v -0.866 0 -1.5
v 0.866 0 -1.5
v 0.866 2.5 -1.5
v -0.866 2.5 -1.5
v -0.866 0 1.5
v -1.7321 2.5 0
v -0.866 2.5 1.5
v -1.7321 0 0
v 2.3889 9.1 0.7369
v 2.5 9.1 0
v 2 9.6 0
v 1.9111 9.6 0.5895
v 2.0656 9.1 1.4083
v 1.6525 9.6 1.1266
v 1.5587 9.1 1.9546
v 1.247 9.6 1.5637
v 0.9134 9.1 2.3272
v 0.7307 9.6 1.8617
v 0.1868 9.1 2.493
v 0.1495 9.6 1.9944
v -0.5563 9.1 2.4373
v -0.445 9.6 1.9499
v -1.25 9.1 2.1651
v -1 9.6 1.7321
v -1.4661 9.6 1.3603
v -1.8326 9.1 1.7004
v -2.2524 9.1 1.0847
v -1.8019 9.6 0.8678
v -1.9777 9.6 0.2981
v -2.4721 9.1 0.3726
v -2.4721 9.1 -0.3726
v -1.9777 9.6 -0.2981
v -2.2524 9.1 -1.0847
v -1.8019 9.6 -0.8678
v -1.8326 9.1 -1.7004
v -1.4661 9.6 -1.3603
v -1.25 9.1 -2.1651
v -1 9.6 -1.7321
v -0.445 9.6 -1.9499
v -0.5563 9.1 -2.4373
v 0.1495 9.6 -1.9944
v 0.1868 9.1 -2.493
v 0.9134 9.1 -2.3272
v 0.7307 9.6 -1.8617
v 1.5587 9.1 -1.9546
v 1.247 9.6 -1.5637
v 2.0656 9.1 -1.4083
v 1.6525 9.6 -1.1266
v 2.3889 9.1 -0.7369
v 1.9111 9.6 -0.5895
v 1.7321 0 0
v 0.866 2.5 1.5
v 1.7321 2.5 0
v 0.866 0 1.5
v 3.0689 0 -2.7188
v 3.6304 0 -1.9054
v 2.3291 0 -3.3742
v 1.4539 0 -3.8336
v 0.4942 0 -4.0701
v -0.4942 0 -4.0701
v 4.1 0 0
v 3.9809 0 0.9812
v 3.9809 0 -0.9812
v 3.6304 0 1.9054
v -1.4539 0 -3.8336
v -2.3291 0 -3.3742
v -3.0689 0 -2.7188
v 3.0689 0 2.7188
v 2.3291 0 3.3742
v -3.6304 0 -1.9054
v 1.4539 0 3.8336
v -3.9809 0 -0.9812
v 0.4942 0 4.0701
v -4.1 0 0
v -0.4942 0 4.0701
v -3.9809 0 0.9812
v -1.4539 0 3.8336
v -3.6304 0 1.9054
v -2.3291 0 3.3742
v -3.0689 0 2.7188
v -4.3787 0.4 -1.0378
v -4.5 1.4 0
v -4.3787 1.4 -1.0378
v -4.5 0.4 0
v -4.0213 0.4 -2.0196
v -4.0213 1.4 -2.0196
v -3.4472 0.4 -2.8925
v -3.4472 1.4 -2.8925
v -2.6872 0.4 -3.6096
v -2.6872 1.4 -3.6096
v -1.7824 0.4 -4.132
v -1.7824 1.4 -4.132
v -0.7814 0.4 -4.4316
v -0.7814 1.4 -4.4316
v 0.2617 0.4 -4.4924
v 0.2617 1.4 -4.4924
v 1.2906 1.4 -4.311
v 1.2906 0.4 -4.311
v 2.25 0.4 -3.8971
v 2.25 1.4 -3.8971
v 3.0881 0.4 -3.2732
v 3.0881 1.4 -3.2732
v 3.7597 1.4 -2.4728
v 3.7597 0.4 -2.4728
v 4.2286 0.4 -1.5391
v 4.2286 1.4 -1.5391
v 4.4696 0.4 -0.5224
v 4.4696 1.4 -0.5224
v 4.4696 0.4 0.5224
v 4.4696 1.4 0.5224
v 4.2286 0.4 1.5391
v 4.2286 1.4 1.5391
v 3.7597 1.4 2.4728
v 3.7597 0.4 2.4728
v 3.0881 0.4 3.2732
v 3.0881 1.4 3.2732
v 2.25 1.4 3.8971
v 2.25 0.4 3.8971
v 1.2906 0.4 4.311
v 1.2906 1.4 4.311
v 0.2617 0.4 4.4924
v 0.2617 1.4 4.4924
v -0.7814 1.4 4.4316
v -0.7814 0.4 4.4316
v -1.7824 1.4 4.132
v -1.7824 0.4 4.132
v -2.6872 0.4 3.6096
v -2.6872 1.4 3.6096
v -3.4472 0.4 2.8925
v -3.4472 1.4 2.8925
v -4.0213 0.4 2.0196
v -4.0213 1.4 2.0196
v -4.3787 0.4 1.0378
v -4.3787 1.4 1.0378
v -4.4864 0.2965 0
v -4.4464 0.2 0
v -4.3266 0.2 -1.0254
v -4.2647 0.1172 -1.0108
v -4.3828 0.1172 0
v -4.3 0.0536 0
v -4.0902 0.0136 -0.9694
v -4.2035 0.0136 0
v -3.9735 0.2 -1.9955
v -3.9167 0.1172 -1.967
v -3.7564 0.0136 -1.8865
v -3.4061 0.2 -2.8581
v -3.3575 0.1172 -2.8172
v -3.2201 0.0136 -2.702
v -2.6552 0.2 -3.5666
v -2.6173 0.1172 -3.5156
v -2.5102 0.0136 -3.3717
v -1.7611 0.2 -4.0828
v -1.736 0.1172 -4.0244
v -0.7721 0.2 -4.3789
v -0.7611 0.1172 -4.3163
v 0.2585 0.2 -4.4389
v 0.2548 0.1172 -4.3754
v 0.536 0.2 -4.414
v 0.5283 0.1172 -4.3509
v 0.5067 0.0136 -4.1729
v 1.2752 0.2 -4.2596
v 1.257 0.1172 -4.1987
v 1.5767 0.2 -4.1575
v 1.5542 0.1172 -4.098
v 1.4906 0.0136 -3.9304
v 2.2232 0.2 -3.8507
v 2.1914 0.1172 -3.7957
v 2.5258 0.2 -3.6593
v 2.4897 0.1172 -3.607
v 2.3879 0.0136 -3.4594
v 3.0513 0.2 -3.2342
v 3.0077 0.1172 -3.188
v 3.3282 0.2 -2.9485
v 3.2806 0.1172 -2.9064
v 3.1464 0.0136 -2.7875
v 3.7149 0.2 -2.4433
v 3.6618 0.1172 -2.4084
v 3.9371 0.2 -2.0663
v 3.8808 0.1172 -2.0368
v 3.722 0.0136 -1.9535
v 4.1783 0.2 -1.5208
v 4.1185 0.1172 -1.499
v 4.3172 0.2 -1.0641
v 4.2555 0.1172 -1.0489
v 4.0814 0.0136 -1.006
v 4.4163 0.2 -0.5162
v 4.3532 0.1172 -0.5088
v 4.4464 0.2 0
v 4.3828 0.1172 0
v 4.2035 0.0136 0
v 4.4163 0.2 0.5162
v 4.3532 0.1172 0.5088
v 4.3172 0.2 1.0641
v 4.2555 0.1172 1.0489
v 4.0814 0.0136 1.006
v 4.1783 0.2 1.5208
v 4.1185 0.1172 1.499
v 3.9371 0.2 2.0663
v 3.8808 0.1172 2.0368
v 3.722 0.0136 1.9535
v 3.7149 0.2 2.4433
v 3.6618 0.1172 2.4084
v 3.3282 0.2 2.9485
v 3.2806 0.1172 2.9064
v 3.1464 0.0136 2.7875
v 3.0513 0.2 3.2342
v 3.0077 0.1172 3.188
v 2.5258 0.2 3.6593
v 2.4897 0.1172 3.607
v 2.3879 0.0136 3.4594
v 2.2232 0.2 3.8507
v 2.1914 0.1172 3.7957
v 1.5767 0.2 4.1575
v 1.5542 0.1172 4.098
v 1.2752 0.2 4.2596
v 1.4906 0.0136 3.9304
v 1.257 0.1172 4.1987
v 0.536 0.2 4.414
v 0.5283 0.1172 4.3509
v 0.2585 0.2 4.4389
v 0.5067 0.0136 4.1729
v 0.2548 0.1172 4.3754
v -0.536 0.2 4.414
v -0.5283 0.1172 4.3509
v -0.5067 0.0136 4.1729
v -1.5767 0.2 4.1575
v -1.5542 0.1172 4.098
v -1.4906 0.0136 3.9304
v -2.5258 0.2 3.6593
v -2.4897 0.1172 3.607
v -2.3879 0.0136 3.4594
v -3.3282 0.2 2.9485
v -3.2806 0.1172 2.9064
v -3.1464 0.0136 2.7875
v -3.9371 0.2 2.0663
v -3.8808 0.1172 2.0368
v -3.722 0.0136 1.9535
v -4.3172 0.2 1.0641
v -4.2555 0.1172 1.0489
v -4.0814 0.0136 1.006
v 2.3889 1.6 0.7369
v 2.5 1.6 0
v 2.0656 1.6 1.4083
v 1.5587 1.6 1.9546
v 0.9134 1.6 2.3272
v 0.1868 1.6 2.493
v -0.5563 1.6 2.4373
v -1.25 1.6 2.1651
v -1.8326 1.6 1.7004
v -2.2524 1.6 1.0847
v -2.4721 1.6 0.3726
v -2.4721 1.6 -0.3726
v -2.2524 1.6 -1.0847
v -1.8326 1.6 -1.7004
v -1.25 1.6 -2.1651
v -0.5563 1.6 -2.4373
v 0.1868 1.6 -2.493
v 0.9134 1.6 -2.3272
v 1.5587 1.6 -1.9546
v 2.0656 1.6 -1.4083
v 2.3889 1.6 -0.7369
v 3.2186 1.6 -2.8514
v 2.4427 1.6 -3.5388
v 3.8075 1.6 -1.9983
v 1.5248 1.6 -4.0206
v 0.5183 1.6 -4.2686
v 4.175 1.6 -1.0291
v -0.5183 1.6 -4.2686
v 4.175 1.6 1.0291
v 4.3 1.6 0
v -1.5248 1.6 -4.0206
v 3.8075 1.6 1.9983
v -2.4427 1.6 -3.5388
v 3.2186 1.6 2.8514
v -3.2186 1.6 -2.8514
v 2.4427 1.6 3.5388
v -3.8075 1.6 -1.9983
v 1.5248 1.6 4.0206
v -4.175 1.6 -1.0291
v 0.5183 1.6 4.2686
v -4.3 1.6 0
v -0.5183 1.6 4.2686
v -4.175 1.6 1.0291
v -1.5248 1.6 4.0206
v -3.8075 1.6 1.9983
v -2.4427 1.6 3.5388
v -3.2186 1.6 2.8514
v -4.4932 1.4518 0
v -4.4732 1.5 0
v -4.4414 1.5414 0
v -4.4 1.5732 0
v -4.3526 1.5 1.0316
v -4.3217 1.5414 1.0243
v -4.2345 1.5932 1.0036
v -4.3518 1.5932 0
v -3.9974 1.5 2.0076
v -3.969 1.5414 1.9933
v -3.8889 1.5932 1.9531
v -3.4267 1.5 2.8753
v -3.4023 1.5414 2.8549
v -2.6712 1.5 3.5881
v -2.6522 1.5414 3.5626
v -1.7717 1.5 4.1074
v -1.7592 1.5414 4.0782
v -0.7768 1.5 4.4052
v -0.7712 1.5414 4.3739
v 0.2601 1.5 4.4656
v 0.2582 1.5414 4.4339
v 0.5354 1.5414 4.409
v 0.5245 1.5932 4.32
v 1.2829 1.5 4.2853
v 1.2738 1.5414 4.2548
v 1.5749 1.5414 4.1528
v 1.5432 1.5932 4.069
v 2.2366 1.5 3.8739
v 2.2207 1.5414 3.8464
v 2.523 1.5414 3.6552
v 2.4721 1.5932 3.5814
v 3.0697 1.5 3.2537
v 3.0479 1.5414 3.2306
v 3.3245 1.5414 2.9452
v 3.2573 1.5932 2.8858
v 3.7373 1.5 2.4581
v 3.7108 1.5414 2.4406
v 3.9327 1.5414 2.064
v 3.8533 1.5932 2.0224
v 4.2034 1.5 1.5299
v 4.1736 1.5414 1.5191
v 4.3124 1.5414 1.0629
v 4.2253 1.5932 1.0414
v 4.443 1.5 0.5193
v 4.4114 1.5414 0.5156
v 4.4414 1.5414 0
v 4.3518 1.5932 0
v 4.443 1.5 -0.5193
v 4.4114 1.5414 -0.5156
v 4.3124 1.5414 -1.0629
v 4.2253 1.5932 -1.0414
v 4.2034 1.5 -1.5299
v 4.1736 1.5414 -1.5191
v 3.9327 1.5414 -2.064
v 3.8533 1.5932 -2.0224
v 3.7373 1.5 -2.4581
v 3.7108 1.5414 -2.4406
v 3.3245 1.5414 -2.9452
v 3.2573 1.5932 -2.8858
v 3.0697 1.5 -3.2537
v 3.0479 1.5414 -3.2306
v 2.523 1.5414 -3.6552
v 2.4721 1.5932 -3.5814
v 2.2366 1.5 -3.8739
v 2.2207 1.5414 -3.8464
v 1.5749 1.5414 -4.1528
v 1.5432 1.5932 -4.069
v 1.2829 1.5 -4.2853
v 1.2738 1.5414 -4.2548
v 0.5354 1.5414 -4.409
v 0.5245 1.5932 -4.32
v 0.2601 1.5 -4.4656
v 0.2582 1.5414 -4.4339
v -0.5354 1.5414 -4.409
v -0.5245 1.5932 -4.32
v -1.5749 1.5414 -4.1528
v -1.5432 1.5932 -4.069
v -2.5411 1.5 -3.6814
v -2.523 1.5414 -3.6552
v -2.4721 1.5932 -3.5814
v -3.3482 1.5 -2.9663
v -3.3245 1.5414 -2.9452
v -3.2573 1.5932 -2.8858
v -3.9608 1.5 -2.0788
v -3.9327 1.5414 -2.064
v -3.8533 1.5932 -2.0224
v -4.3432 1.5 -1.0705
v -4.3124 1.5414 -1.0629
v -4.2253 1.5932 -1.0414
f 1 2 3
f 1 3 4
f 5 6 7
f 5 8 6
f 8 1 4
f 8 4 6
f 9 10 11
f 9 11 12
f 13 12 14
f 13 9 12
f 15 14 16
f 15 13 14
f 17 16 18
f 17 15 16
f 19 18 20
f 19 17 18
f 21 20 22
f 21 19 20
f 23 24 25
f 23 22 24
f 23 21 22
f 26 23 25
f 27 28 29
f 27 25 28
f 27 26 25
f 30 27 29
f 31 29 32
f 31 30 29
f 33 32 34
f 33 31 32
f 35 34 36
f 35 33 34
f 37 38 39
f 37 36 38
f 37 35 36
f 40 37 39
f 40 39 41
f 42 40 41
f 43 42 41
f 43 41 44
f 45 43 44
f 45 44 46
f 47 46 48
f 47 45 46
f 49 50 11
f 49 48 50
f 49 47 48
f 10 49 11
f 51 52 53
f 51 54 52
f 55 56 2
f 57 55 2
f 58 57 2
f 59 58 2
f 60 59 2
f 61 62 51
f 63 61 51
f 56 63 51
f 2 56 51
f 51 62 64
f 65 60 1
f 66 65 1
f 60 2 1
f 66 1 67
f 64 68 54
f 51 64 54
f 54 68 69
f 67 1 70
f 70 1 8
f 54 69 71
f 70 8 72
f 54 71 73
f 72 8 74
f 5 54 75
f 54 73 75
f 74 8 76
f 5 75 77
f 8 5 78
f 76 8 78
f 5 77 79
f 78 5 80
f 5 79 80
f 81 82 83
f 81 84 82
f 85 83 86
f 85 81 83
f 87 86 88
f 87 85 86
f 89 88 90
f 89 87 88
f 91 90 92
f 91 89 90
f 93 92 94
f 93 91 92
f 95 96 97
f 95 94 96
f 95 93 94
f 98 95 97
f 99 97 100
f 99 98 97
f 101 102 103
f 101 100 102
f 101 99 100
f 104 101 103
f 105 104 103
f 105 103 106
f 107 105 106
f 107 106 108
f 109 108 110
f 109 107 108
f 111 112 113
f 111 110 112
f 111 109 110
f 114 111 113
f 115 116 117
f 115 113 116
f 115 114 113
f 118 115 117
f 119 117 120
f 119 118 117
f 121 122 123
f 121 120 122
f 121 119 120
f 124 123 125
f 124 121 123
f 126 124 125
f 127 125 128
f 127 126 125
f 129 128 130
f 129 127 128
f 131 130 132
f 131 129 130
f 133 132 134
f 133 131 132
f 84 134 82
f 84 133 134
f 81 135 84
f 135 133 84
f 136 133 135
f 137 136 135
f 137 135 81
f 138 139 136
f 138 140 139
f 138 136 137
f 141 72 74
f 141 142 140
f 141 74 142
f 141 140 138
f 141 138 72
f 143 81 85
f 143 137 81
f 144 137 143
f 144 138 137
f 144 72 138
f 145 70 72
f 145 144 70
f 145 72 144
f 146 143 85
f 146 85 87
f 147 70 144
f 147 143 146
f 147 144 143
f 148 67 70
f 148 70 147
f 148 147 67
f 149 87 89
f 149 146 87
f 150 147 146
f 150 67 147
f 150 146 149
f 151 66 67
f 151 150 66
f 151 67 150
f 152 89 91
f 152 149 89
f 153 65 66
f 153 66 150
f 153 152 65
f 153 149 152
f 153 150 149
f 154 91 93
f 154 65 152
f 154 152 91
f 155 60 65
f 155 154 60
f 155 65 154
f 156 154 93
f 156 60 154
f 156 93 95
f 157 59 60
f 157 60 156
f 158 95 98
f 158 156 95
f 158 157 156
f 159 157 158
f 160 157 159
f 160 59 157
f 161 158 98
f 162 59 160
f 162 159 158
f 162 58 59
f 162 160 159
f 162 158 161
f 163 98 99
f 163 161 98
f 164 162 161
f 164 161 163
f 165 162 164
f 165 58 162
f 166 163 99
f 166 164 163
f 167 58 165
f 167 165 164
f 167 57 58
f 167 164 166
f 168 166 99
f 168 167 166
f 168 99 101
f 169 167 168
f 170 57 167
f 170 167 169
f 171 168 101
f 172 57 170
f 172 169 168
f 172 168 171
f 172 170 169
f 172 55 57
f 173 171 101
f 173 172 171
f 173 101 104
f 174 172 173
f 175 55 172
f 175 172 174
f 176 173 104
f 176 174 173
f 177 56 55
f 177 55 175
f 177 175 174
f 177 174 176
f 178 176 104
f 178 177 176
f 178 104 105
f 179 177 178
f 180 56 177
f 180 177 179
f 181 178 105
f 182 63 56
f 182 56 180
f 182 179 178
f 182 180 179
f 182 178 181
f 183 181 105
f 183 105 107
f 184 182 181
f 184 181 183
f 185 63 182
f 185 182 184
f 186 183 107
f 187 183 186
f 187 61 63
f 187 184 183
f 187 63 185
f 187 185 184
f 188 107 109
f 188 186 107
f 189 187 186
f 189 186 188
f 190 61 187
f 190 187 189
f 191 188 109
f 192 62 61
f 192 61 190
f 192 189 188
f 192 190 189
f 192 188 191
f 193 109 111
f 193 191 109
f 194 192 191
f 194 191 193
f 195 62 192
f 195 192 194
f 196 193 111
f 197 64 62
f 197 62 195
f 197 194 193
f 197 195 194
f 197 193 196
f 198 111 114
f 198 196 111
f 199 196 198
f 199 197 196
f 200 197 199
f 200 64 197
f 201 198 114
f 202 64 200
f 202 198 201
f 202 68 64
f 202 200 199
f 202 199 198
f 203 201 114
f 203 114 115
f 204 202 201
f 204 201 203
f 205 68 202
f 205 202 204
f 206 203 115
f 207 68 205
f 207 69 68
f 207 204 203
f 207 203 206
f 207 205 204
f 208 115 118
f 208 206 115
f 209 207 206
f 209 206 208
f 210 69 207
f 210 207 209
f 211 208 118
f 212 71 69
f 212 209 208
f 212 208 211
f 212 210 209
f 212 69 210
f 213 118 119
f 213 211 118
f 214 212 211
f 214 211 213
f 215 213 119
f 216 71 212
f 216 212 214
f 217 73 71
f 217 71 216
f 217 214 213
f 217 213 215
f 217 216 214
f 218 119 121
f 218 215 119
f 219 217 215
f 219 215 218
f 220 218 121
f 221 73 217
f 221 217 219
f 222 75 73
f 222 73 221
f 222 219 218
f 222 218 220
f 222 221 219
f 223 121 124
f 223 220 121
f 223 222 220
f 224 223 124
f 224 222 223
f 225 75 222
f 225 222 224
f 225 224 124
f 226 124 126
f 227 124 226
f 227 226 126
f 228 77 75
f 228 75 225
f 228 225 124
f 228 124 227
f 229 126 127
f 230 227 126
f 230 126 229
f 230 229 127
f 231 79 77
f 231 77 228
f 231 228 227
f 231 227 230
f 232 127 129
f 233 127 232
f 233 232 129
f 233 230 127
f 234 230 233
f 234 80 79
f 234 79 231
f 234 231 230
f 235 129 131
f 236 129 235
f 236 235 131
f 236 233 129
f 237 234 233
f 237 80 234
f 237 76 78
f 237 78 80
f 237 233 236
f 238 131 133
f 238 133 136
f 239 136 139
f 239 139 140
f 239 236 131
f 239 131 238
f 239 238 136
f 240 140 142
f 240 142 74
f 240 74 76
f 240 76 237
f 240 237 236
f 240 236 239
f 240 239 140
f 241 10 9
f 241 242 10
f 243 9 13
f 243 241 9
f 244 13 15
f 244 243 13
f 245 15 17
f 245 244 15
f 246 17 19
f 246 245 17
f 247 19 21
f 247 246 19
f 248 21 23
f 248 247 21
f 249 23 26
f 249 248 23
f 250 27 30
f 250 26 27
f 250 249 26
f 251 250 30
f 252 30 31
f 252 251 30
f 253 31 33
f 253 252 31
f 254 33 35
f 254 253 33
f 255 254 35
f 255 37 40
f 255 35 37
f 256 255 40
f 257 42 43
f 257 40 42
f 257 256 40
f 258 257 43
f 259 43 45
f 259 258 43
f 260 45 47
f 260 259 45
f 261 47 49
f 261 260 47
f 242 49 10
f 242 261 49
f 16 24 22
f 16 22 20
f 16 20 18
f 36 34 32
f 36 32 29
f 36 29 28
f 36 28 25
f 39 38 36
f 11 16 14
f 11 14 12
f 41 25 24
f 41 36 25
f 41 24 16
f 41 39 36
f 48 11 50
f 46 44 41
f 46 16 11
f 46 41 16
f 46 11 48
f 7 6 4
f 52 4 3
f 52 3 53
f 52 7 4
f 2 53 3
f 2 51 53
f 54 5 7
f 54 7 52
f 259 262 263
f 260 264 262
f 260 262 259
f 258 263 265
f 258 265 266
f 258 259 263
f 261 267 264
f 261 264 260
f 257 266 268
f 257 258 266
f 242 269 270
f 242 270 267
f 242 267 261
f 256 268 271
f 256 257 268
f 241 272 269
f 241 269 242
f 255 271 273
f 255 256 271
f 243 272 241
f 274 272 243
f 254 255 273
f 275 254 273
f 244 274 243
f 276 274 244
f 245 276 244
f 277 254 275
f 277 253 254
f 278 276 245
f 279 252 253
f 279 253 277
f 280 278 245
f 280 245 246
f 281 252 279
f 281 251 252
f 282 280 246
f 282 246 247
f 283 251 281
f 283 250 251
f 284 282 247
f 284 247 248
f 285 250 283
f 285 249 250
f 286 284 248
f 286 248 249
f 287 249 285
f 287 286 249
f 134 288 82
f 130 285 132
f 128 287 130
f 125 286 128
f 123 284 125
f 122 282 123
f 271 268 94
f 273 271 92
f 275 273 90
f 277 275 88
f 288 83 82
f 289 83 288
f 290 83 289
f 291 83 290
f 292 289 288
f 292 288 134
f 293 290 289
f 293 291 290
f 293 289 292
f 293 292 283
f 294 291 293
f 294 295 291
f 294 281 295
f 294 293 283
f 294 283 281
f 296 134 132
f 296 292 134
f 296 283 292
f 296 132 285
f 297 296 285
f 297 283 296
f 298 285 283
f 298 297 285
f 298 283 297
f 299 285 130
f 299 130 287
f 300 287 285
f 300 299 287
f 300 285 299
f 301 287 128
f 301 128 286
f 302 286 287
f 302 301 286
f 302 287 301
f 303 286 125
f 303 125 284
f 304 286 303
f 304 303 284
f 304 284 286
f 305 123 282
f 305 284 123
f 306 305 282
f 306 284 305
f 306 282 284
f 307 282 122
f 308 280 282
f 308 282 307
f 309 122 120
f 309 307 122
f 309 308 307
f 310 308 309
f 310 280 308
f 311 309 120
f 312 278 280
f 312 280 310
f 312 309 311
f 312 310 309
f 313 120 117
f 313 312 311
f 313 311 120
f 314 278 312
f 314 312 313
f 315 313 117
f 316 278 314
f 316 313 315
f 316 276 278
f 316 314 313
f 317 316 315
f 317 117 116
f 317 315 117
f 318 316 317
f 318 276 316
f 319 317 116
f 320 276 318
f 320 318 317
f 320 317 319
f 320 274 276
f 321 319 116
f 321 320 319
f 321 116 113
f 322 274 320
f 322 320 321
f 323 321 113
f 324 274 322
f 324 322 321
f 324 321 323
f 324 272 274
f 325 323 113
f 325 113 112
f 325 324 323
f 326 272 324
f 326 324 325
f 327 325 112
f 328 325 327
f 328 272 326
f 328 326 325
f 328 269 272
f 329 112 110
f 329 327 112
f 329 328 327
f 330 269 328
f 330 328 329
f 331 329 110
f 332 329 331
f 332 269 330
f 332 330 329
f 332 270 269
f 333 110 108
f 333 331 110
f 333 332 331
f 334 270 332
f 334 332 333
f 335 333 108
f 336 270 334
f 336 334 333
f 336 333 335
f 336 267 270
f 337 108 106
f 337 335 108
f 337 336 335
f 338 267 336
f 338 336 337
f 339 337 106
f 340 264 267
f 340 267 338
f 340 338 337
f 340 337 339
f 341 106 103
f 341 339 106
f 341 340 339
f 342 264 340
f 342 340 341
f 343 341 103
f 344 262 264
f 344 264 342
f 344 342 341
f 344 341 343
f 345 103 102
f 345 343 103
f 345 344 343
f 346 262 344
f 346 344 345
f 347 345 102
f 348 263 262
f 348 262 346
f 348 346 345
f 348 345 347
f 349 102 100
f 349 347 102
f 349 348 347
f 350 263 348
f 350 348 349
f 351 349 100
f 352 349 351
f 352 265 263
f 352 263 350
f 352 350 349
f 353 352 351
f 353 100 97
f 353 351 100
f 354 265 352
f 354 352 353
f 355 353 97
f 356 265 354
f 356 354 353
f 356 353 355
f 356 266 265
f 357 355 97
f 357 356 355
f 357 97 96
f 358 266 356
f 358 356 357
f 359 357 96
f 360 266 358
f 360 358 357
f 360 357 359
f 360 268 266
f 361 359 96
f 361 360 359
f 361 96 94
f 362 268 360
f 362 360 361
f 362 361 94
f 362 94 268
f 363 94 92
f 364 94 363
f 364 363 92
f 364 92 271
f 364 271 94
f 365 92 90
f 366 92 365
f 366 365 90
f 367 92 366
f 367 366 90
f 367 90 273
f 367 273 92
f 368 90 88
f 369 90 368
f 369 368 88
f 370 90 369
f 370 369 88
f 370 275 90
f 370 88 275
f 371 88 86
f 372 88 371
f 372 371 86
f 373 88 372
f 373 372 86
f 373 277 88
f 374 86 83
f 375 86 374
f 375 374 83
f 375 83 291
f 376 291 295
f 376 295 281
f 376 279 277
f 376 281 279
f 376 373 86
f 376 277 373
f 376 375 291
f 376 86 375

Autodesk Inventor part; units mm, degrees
ref_plane "YZ Plane" through (0, 0, 0) normal (1, 0, 0) x (0, 1, 0)
ref_plane "XZ Plane" through (0, 0, 0) normal (0, 1, 0) x (-1, 0, 0)
ref_plane "XY Plane" through (0, 0, 0) normal (0, 0, 1) x (1, 0, 0)
sketch "Boceto1" plane through (0, 0, 0) normal (0, 1, 0) x (-1, 0, 0)
  circle A0 centre (0, 0) radius 4.5
  dimension "d0" = 9
extrude "Extrusión1" add sketch "Boceto1" along normal blind 1.6
sketch "Boceto2" plane through (0, 1.6, 0) normal (0, 1, 0) x (1, 0, 0)
  circle A0 centre (0, 0) radius 2.5
  dimension "d3" = 5
extrude "Extrusión2" add sketch "Boceto2" along normal blind 8
fillet "Empalme1" radius 0.4 1 edges at (4.5, 0, 0)
fillet "Empalme2" radius 0.2 1 edges at (4.5, 1.6, 0)
sketch "Boceto3" plane through (0, 0, 0) normal (0, -1, 0) x (1, 0, 0)
  line L0 (-1.7321, 0) -> (-0.866, 1.5)
  line L1 (-0.866, 1.5) -> (0.866, 1.5)
  line L2 (0.866, 1.5) -> (1.7321, 0)
  line L3 (1.7321, 0) -> (0.866, -1.5)
  line L4 (0.866, -1.5) -> (-0.866, -1.5)
  line L5 (-0.866, -1.5) -> (-1.7321, 0)
  point P0 (0, 0)
  point P1 (0, 0)
  dimension "d8" = 3
extrude "Extrusión3" cut sketch "Boceto3" against normal blind 2.5
chamfer "Chaflán1" distance 0.5 angle 45 1 edges at (-2.5, 9.6, 0)
thread "Rosca2" size "M5x0.8" class "6g" standard "ANSI Metric M Profile" length 12 offset 3
properties part number "Perno M5x8cabeza plana_" material "Hierro, gris"
